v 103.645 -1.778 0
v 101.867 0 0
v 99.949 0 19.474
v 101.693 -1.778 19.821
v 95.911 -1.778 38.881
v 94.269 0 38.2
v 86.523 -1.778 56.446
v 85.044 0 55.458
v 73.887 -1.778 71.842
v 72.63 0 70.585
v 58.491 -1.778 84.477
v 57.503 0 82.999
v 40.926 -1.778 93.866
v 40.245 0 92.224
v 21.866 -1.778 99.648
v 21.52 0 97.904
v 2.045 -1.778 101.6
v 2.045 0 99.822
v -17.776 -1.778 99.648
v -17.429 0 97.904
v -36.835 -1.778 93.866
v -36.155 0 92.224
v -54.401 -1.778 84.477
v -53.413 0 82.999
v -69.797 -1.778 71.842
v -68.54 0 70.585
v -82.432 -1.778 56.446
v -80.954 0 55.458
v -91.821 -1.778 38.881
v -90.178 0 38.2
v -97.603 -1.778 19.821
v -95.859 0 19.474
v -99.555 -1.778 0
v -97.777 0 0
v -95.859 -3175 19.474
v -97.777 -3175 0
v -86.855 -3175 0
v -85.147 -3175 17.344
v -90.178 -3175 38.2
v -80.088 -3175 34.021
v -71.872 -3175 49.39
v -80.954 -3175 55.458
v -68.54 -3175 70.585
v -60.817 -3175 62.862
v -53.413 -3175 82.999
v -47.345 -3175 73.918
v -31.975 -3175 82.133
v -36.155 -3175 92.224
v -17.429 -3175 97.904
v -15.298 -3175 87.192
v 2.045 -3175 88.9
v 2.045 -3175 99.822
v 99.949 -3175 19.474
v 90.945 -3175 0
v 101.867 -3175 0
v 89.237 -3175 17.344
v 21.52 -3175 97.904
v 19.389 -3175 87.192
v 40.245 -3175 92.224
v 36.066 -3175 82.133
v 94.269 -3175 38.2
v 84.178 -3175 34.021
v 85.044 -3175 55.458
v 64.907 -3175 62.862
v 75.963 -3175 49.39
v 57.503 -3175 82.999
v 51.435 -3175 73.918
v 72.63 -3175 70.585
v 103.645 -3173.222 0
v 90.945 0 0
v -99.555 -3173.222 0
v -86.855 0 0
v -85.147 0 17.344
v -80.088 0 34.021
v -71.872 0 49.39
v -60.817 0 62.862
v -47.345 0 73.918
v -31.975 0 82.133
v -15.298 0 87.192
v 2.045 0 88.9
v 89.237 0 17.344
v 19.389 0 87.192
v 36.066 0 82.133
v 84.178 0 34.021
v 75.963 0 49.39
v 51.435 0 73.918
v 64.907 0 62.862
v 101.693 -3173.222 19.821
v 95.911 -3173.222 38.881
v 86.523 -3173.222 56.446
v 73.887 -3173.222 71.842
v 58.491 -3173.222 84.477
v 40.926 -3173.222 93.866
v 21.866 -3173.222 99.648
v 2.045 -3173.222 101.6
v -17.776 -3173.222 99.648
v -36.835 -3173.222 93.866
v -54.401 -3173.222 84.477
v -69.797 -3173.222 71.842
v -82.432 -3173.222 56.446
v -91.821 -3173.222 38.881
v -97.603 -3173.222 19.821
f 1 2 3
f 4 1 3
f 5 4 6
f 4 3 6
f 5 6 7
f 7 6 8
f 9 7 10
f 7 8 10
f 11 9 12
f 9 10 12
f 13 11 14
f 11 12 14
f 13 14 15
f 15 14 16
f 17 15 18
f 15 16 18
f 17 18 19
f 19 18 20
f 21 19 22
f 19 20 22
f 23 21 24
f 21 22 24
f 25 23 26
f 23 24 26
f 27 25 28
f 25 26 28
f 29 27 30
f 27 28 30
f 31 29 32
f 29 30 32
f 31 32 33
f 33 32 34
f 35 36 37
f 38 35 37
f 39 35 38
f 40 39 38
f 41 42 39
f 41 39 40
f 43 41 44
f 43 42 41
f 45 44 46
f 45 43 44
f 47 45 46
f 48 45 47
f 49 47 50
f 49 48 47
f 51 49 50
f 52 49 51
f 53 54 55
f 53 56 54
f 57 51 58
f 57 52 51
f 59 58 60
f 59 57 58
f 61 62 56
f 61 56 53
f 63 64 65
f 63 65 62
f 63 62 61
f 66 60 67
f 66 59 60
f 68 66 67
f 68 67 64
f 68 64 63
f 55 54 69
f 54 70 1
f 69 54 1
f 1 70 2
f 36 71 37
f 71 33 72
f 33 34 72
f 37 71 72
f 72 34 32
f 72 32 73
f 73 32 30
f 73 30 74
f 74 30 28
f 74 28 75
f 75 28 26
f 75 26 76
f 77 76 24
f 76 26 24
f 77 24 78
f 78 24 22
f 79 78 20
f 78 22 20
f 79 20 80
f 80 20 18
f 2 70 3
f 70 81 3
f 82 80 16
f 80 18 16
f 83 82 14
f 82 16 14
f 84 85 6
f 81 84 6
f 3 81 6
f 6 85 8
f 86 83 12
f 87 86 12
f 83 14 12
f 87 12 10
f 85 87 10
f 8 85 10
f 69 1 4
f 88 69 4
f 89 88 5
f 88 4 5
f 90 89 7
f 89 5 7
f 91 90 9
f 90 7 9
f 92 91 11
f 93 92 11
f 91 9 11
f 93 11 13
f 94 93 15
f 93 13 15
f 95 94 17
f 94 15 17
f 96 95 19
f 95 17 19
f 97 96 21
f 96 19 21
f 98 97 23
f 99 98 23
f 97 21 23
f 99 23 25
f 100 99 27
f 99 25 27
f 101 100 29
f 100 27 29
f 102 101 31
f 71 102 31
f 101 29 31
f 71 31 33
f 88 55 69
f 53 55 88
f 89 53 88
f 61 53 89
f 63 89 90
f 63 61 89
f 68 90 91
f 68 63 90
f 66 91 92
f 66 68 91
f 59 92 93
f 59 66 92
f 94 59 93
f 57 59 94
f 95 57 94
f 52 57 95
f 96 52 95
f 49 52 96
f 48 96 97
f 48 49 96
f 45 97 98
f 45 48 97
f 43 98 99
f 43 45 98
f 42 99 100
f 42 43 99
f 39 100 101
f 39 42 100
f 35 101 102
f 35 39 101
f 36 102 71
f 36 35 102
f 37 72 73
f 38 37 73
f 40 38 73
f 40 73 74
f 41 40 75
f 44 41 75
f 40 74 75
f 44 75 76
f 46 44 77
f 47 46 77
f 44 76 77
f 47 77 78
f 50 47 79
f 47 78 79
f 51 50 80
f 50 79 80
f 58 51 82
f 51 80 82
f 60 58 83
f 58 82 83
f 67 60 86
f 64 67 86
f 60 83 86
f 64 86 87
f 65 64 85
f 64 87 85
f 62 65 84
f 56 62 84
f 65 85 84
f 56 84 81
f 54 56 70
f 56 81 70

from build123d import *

# Parameters (mm, degrees)
F1_DEPTH = 3175
F2_SIZE  = 1.778


with BuildPart() as f1:
    # F0 (on Front) → F1 (new body)
    with BuildSketch(Plane.XZ):
        with BuildLine():
            Line((90.945219, 0), (103.645219, 0))
            ThreePointArc((103.645219, 0), (2.045219, 101.6), (-99.554781, 0))
            Line((-99.554781, 0), (-86.854781, 0))
            ThreePointArc((-86.854781, 0), (2.045219, 88.9), (90.945219, 0))
        make_face()
    extrude(amount=F1_DEPTH)

    # F2
    f2_edges = [f1.edges().sort_by_distance(p)[0] for p in [
        (2.045219, 0, 101.6),
        (2.045219, -3175, 101.6),
    ]]
    chamfer(f2_edges, length=F2_SIZE)


solid = f1.part
